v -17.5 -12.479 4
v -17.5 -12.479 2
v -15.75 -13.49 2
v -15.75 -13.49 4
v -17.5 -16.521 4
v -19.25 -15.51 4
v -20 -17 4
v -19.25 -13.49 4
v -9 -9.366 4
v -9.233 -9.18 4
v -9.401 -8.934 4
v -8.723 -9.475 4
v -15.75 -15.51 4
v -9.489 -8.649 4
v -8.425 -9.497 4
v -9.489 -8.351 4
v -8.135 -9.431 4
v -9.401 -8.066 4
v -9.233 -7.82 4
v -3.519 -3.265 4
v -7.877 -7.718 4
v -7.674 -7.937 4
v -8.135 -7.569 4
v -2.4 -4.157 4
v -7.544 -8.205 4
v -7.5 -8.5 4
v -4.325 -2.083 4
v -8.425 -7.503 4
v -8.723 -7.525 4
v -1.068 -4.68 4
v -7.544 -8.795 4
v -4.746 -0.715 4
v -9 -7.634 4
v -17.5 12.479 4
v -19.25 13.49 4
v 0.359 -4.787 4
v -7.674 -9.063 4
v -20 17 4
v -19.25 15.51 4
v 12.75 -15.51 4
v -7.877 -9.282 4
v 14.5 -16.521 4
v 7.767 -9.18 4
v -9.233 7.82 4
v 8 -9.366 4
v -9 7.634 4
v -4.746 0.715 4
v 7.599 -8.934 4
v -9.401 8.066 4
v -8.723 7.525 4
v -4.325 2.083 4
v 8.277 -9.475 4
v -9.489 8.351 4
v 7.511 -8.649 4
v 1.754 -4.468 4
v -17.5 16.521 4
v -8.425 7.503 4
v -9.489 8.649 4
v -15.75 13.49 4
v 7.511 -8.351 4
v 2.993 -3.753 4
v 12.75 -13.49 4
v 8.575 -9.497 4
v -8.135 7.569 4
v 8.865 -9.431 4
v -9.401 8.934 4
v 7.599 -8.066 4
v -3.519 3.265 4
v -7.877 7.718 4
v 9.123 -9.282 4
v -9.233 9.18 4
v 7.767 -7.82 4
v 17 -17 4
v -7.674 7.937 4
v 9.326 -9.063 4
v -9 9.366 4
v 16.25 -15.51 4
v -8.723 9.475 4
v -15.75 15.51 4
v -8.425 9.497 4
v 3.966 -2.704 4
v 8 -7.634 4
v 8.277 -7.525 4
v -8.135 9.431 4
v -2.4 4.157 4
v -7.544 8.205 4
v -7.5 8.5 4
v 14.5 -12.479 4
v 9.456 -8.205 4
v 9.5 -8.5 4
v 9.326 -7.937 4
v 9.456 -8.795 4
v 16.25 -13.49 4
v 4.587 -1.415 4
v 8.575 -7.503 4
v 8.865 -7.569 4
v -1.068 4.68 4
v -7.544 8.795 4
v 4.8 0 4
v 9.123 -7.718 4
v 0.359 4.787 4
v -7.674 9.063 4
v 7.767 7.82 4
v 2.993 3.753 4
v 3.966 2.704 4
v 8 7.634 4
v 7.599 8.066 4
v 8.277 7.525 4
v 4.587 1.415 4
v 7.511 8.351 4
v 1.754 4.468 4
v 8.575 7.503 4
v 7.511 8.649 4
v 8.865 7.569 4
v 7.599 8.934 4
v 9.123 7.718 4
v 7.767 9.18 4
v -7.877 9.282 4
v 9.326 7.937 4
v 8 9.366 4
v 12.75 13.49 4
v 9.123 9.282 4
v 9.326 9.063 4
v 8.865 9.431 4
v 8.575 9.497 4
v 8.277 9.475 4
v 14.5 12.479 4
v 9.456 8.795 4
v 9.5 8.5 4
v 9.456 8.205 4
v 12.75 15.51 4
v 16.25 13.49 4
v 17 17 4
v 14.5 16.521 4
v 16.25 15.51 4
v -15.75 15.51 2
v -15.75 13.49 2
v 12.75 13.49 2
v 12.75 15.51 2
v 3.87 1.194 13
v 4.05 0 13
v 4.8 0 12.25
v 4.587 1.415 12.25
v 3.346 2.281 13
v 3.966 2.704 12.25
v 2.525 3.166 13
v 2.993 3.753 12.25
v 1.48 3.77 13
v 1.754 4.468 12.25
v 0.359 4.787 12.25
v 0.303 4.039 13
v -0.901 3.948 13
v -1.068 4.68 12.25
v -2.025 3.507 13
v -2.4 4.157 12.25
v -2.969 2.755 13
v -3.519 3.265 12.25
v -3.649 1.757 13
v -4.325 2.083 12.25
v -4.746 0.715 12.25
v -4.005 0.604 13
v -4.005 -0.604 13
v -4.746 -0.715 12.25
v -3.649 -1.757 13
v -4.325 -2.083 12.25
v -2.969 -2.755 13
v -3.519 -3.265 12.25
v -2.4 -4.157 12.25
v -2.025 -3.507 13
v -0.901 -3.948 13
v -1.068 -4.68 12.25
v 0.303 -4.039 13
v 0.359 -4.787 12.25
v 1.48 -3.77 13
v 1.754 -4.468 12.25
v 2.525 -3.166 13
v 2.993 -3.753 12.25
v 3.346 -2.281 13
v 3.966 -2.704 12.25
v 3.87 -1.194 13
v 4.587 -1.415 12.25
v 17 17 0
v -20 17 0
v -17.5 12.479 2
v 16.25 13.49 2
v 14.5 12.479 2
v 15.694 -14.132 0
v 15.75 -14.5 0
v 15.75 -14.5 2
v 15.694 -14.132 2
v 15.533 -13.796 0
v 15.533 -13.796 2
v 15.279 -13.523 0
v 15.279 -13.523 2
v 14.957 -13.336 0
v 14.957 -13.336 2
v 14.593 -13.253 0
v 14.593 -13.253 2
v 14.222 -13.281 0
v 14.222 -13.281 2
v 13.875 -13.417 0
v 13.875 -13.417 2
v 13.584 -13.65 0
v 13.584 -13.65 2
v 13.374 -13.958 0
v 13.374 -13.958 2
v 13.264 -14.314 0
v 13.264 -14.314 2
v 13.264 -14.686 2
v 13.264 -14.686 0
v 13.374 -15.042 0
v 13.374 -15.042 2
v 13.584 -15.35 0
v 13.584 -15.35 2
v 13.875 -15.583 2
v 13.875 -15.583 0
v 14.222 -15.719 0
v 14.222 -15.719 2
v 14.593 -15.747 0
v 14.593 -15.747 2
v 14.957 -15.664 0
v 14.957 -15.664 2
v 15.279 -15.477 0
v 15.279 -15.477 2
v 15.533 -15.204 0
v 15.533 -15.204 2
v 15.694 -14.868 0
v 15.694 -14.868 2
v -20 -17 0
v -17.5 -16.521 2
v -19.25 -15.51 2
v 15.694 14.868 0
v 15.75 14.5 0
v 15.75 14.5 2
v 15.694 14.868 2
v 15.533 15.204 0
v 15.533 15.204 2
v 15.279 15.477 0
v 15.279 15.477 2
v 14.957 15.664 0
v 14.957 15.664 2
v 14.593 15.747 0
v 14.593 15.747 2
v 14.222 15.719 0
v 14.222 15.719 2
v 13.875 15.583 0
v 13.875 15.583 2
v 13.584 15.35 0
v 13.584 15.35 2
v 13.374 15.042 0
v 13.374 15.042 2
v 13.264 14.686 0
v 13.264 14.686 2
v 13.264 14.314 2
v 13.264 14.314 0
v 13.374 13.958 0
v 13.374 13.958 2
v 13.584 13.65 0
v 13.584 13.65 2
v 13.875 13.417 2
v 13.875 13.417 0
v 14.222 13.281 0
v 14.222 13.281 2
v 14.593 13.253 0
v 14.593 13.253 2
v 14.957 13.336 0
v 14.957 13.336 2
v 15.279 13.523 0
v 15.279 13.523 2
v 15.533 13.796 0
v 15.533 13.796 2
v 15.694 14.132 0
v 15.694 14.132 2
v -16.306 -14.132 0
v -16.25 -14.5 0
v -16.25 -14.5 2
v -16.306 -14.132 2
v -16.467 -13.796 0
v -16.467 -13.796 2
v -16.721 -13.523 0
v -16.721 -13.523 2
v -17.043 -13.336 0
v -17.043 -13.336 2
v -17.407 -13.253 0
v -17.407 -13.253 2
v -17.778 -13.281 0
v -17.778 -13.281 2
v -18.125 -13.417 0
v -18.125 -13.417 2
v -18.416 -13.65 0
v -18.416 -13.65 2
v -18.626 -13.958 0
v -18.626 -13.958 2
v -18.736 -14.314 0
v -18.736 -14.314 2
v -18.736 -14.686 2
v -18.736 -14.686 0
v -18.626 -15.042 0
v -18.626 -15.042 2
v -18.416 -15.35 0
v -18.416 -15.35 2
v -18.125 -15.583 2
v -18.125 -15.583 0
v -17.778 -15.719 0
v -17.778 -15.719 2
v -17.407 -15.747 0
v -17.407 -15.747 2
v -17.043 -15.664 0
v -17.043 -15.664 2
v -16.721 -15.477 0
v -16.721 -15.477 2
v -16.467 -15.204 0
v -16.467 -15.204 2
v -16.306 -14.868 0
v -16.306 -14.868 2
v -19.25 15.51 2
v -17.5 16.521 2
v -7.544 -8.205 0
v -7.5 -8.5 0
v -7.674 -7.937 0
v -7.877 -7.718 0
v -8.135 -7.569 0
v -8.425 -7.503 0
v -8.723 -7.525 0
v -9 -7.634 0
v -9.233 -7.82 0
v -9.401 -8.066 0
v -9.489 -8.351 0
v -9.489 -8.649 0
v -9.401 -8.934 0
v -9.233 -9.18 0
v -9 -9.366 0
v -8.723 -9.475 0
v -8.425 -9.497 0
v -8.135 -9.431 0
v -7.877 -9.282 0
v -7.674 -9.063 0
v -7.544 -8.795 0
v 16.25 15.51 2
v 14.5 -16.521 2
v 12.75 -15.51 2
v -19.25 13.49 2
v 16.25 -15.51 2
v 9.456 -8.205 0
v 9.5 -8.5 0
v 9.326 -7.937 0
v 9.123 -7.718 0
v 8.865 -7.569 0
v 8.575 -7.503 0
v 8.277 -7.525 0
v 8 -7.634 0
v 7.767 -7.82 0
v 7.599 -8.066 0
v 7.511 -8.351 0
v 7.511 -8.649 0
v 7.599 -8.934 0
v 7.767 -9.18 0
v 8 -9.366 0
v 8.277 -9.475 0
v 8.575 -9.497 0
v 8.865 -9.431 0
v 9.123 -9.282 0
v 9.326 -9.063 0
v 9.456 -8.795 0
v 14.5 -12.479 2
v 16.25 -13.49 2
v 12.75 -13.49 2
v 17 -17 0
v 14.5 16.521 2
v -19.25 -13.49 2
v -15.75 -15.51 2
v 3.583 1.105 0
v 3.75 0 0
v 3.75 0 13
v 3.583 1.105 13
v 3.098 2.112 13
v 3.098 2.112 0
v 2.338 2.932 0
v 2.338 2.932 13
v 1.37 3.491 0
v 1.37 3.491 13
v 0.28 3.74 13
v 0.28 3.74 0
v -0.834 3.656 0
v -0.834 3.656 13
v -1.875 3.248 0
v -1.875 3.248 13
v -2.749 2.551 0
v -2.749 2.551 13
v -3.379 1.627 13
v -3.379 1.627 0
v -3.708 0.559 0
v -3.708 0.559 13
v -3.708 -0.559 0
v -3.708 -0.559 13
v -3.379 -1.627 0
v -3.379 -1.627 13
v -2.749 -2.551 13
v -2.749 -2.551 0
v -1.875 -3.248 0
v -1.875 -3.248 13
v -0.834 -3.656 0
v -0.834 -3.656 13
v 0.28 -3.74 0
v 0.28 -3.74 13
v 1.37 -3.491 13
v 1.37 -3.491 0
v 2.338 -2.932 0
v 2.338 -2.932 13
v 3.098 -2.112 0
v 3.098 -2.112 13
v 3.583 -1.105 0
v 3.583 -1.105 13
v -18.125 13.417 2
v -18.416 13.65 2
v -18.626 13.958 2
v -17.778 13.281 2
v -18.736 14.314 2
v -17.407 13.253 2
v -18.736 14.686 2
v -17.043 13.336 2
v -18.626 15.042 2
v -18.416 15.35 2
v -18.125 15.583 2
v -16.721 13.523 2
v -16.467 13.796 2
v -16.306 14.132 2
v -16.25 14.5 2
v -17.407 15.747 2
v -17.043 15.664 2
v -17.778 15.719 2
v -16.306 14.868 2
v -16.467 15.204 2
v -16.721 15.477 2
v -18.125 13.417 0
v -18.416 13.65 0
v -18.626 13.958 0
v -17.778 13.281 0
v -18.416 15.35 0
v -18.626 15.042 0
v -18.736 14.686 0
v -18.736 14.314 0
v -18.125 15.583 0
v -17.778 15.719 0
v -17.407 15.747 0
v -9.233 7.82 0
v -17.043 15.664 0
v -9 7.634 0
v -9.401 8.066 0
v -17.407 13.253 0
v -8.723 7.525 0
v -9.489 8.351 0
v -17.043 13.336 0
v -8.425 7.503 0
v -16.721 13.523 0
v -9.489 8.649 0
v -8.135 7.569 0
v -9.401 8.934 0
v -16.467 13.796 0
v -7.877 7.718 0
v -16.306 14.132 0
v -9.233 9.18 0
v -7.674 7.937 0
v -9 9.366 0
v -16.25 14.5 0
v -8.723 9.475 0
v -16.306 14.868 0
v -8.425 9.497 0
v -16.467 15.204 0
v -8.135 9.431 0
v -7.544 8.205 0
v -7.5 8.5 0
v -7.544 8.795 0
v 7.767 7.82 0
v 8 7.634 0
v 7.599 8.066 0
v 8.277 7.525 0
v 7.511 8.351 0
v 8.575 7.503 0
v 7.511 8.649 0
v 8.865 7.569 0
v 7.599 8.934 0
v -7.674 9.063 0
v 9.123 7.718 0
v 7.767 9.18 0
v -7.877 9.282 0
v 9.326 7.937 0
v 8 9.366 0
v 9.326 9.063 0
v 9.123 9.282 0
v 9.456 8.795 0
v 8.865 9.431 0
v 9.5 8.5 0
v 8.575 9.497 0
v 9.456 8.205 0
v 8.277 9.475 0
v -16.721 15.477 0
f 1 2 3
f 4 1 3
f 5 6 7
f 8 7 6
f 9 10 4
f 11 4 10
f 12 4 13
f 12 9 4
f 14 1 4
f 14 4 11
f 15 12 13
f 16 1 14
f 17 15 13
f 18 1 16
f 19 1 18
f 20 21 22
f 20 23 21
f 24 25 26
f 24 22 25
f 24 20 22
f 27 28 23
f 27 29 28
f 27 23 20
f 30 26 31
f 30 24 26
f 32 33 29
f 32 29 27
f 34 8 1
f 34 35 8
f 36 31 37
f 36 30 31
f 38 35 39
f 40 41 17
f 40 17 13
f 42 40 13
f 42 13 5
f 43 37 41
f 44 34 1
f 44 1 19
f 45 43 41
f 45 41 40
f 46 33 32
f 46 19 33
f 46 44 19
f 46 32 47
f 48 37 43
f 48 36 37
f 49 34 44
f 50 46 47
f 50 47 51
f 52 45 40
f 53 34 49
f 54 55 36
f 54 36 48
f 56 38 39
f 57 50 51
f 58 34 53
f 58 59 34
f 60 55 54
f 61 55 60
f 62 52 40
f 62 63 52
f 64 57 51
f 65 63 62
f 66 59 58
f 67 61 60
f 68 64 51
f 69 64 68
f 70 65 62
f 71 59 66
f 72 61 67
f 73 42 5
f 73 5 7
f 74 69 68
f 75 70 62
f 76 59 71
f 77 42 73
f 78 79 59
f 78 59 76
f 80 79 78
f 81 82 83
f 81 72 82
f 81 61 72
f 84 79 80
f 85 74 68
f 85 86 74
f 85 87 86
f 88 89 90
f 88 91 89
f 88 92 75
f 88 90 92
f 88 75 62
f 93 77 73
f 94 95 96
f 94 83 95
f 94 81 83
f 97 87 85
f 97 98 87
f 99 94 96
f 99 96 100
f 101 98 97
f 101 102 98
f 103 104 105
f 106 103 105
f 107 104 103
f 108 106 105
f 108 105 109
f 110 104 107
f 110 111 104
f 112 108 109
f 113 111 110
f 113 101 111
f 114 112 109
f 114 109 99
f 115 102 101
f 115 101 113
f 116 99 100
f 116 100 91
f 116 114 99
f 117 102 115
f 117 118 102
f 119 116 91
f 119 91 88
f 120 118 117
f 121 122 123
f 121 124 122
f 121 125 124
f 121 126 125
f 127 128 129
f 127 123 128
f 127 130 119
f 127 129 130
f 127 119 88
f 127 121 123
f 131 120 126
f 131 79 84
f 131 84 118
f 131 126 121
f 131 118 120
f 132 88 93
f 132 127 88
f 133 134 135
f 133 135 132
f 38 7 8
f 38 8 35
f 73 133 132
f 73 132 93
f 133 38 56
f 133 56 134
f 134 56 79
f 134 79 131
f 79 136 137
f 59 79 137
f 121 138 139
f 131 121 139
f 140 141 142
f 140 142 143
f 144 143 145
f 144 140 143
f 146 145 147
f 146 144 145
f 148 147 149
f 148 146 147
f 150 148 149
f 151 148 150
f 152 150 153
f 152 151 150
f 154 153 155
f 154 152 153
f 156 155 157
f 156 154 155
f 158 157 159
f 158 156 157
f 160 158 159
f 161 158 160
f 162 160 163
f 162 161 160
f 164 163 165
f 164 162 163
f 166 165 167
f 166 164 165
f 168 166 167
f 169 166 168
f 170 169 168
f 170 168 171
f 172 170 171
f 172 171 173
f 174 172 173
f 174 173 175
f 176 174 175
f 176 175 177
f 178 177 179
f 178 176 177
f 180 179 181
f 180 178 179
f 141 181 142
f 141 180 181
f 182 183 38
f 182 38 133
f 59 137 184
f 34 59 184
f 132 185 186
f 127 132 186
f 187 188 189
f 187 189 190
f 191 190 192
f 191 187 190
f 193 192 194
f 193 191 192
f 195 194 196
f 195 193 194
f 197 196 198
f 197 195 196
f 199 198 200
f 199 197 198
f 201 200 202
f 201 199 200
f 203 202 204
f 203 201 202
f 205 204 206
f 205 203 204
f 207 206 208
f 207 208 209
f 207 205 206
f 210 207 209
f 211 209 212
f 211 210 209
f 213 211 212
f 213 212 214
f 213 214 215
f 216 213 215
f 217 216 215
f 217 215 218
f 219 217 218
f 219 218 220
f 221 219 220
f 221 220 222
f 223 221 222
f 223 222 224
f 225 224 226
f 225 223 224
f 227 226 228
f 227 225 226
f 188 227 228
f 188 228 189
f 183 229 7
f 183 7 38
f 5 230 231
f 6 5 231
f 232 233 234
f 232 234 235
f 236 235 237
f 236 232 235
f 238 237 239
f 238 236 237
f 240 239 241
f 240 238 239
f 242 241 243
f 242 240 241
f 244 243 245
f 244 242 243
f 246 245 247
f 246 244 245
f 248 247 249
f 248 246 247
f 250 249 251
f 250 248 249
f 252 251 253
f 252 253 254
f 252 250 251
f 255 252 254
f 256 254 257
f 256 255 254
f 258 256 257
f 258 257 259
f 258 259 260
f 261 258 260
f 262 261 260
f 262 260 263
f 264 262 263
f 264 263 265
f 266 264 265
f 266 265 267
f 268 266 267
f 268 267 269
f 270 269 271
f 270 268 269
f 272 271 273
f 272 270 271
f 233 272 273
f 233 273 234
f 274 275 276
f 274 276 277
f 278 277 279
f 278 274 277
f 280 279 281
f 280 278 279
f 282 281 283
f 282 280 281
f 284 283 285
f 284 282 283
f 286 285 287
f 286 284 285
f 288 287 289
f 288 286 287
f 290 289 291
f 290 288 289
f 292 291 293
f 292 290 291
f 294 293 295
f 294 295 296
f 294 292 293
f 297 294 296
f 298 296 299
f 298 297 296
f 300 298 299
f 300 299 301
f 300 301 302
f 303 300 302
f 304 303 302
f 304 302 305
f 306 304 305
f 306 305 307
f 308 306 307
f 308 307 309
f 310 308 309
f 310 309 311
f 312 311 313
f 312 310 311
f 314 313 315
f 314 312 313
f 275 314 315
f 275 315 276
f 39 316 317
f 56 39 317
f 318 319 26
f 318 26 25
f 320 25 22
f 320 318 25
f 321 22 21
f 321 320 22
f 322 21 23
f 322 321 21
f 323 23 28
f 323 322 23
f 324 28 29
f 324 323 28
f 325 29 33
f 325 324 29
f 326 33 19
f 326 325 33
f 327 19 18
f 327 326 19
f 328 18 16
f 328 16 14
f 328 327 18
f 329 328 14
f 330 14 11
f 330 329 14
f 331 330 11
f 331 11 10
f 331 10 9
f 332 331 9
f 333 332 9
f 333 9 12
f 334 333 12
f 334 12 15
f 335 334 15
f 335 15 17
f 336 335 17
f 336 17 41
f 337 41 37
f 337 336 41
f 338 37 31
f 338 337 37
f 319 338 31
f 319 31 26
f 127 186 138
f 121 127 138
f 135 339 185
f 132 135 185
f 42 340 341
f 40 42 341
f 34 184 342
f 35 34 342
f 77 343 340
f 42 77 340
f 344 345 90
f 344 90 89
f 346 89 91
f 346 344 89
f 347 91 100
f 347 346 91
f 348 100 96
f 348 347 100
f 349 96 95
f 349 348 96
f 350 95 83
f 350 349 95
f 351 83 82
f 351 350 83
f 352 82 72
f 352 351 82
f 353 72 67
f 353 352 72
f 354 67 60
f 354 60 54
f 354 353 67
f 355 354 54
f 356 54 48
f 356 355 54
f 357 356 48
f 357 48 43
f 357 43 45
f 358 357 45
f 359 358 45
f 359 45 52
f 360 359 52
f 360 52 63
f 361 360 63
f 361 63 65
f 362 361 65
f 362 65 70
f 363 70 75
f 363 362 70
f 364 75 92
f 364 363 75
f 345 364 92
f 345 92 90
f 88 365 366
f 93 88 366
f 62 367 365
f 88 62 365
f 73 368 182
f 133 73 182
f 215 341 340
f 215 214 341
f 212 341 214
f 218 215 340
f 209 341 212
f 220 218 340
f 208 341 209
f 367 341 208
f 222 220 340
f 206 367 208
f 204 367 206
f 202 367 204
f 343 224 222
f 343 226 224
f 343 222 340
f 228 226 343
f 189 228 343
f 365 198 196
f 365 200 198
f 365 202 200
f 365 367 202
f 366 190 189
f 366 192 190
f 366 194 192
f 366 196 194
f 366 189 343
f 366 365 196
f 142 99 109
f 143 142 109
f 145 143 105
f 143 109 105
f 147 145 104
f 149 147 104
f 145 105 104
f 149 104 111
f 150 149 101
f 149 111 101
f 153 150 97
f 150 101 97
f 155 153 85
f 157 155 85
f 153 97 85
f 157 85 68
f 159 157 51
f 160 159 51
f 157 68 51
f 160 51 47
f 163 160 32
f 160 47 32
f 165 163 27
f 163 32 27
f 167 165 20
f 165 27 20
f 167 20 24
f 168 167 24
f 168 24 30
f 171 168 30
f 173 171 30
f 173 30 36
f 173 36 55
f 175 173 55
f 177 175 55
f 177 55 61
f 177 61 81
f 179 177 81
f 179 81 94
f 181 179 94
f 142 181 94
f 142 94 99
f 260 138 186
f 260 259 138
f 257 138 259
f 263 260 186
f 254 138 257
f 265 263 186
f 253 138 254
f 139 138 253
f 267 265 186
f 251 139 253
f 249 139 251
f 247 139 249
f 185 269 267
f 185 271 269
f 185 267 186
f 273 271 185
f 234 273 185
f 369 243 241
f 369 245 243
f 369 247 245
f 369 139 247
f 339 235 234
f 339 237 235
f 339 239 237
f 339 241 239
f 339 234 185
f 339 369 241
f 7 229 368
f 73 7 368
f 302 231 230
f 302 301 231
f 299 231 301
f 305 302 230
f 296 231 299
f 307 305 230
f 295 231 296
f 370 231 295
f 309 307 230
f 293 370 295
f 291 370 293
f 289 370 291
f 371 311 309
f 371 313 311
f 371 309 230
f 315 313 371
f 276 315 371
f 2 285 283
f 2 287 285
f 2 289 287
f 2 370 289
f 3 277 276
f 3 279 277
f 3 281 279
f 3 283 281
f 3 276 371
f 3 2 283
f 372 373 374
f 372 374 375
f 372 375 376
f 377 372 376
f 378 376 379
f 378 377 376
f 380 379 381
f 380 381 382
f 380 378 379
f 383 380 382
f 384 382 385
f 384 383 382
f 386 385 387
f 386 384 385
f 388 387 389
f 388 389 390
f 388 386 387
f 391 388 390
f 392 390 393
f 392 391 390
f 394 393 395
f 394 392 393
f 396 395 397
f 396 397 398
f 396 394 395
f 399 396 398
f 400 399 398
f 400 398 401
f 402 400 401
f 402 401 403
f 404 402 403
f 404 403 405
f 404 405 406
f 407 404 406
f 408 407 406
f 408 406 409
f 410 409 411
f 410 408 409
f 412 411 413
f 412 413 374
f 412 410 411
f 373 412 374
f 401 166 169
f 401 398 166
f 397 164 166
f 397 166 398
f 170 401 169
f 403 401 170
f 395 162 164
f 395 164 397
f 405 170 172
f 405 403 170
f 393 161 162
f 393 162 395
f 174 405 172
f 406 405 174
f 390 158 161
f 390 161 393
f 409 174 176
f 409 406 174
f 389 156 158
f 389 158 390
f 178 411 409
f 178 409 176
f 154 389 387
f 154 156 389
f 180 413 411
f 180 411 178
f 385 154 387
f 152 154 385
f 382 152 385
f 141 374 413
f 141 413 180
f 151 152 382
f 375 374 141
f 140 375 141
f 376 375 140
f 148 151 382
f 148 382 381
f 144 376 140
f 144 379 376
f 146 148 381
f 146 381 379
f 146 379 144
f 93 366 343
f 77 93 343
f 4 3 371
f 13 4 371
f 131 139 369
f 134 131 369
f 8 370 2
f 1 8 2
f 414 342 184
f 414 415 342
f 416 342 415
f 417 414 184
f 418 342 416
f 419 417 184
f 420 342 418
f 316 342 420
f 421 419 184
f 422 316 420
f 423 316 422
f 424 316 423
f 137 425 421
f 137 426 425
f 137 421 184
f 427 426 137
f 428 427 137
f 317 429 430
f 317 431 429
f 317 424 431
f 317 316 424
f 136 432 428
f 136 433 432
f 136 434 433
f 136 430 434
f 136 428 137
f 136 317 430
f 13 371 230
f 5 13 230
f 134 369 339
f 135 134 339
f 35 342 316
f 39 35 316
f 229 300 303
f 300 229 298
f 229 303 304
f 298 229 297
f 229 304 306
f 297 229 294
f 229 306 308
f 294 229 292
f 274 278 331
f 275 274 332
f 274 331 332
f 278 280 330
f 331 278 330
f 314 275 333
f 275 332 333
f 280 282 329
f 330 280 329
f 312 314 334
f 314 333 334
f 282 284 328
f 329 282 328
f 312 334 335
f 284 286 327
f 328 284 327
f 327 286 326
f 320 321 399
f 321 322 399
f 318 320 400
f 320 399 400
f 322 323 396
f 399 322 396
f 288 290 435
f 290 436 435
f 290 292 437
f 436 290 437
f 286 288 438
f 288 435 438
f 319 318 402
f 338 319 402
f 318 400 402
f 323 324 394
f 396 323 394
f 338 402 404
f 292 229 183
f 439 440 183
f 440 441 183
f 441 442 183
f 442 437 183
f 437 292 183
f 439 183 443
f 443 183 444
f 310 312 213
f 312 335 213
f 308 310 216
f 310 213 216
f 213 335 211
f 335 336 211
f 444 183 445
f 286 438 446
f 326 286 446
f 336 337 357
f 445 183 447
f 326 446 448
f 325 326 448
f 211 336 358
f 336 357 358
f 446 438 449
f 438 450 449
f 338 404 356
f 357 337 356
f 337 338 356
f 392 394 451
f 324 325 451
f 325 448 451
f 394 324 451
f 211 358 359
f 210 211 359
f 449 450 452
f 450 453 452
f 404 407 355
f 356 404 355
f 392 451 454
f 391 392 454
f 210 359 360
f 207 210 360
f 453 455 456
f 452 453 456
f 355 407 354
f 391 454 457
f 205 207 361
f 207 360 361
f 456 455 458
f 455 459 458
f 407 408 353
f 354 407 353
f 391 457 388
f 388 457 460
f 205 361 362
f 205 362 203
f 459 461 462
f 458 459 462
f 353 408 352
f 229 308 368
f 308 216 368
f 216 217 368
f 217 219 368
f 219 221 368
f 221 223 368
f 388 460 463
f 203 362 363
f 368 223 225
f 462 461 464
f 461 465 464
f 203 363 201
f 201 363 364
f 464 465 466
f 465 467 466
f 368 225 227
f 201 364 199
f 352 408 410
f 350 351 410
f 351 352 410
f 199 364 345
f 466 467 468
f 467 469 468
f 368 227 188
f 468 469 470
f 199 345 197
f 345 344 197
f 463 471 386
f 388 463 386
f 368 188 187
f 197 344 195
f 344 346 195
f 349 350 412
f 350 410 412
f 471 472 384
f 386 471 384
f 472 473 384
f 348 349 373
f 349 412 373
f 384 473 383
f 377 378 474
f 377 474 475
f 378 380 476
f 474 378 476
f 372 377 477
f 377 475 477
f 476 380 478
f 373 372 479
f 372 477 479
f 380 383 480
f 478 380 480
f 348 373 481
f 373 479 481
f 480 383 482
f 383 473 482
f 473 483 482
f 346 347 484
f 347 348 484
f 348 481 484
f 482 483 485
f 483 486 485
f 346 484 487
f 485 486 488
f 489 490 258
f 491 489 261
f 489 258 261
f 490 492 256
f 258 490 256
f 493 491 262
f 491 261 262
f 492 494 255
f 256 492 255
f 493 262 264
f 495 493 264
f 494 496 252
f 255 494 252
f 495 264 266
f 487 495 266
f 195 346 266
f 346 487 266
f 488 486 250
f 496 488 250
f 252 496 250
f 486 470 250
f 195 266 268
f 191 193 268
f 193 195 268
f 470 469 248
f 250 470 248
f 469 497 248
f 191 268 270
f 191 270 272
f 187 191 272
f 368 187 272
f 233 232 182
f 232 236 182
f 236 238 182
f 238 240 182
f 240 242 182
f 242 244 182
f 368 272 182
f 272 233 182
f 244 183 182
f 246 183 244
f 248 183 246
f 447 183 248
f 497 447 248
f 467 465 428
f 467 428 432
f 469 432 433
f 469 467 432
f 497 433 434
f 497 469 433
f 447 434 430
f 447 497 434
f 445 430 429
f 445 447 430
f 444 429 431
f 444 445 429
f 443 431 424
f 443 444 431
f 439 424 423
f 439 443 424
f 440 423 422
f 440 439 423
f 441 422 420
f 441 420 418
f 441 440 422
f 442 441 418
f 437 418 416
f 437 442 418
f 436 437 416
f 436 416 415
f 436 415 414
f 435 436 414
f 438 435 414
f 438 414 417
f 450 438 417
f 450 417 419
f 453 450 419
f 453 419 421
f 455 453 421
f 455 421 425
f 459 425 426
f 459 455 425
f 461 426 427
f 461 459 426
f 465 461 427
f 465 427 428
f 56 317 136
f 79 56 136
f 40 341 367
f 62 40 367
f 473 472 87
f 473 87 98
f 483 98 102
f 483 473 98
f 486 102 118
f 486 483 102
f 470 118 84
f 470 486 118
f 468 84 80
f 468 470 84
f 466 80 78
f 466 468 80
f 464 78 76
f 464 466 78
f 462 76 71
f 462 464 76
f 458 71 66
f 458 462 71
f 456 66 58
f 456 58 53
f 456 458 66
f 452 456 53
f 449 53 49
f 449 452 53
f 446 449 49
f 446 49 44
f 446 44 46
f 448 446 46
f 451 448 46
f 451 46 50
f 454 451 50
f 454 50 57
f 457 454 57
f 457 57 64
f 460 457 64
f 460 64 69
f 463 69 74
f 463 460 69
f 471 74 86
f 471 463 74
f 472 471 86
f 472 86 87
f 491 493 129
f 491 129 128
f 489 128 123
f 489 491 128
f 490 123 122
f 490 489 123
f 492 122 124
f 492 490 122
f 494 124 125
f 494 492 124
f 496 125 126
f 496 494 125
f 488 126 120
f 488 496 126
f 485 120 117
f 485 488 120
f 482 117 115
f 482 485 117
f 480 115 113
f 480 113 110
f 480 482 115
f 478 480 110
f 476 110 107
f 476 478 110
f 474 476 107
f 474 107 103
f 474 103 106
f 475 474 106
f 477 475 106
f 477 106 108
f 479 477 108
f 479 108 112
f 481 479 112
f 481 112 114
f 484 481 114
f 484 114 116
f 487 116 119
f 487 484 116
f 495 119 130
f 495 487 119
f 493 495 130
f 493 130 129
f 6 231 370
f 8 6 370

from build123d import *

# Parameters (mm, degrees)
F0_W     = 37
F0_H     = 34
F0_R     = 1
F0_R_2   = 4.8
F1_DEPTH = 4
F0_R_3   = 3.75
F2_DEPTH = 13
F3_SIZE  = 0.75
F0_R_4   = 1.25
F4_DEPTH = 2


with BuildPart() as f1:
    # F0 (on Top) → F1 (new body)
    with BuildSketch(Plane.XY):
        with Locations((-1.5, 0)):
            Rectangle(F0_W, F0_H)
        Polygon((-19.25, -15.510363), (-19.25, -13.489637), (-17.5, -12.479274), (-15.75, -13.489637), (-15.75, -15.510363), (-17.5, -16.520726), align=None, mode=Mode.SUBTRACT)
        with Locations((-8.5, -8.5)):
            Circle(F0_R, mode=Mode.SUBTRACT)
        Polygon((14.5, -16.520726), (12.75, -15.510363), (12.75, -13.489637), (14.5, -12.479274), (16.25, -13.489637), (16.25, -15.510363), align=None, mode=Mode.SUBTRACT)
        with Locations((8.5, -8.5)):
            Circle(F0_R, mode=Mode.SUBTRACT)
        Polygon((-19.25, 15.510363), (-17.5, 16.520726), (-15.75, 15.510363), (-15.75, 13.489637), (-17.5, 12.479274), (-19.25, 13.489637), align=None, mode=Mode.SUBTRACT)
        with Locations((-8.5, 8.5)):
            Circle(F0_R, mode=Mode.SUBTRACT)
        Circle(F0_R_2, mode=Mode.SUBTRACT)
        with Locations((8.5, 8.5)):
            Circle(F0_R, mode=Mode.SUBTRACT)
        Polygon((14.5, 12.479274), (12.75, 13.489637), (12.75, 15.510363), (14.5, 16.520726), (16.25, 15.510363), (16.25, 13.489637), align=None, mode=Mode.SUBTRACT)
    extrude(amount=F1_DEPTH)

    # F0 (on Top) → F2 (join)
    with BuildSketch(Plane.XY):
        Circle(F0_R_2)
        Circle(F0_R_3, mode=Mode.SUBTRACT)
    extrude(amount=F2_DEPTH)

    # F3
    f3_edges = [f1.edges().sort_by_distance(p)[0] for p in [
        (-4.8, 0, 13),
    ]]
    chamfer(f3_edges, length=F3_SIZE)

    # F0 (on Top) → F4 (join)
    with BuildSketch(Plane.XY):
        Polygon((-17.5, -12.479274), (-19.25, -13.489637), (-19.25, -15.510363), (-17.5, -16.520726), (-15.75, -15.510363), (-15.75, -13.489637), align=None)
        with Locations((-17.5, -14.5)):
            Circle(F0_R_4, mode=Mode.SUBTRACT)
        Polygon((12.75, -13.489637), (12.75, -15.510363), (14.5, -16.520726), (16.25, -15.510363), (16.25, -13.489637), (14.5, -12.479274), align=None)
        with Locations((14.5, -14.5)):
            Circle(F0_R_4, mode=Mode.SUBTRACT)
        Polygon((12.75, 15.510363), (12.75, 13.489637), (14.5, 12.479274), (16.25, 13.489637), (16.25, 15.510363), (14.5, 16.520726), align=None)
        with Locations((14.5, 14.5)):
            Circle(F0_R_4, mode=Mode.SUBTRACT)
        Polygon((-15.75, 15.510363), (-17.5, 16.520726), (-19.25, 15.510363), (-19.25, 13.489637), (-17.5, 12.479274), (-15.75, 13.489637), align=None)
        with Locations((-17.5, 14.5)):
            Circle(F0_R_4, mode=Mode.SUBTRACT)
    extrude(amount=F4_DEPTH)


solid = f1.part
